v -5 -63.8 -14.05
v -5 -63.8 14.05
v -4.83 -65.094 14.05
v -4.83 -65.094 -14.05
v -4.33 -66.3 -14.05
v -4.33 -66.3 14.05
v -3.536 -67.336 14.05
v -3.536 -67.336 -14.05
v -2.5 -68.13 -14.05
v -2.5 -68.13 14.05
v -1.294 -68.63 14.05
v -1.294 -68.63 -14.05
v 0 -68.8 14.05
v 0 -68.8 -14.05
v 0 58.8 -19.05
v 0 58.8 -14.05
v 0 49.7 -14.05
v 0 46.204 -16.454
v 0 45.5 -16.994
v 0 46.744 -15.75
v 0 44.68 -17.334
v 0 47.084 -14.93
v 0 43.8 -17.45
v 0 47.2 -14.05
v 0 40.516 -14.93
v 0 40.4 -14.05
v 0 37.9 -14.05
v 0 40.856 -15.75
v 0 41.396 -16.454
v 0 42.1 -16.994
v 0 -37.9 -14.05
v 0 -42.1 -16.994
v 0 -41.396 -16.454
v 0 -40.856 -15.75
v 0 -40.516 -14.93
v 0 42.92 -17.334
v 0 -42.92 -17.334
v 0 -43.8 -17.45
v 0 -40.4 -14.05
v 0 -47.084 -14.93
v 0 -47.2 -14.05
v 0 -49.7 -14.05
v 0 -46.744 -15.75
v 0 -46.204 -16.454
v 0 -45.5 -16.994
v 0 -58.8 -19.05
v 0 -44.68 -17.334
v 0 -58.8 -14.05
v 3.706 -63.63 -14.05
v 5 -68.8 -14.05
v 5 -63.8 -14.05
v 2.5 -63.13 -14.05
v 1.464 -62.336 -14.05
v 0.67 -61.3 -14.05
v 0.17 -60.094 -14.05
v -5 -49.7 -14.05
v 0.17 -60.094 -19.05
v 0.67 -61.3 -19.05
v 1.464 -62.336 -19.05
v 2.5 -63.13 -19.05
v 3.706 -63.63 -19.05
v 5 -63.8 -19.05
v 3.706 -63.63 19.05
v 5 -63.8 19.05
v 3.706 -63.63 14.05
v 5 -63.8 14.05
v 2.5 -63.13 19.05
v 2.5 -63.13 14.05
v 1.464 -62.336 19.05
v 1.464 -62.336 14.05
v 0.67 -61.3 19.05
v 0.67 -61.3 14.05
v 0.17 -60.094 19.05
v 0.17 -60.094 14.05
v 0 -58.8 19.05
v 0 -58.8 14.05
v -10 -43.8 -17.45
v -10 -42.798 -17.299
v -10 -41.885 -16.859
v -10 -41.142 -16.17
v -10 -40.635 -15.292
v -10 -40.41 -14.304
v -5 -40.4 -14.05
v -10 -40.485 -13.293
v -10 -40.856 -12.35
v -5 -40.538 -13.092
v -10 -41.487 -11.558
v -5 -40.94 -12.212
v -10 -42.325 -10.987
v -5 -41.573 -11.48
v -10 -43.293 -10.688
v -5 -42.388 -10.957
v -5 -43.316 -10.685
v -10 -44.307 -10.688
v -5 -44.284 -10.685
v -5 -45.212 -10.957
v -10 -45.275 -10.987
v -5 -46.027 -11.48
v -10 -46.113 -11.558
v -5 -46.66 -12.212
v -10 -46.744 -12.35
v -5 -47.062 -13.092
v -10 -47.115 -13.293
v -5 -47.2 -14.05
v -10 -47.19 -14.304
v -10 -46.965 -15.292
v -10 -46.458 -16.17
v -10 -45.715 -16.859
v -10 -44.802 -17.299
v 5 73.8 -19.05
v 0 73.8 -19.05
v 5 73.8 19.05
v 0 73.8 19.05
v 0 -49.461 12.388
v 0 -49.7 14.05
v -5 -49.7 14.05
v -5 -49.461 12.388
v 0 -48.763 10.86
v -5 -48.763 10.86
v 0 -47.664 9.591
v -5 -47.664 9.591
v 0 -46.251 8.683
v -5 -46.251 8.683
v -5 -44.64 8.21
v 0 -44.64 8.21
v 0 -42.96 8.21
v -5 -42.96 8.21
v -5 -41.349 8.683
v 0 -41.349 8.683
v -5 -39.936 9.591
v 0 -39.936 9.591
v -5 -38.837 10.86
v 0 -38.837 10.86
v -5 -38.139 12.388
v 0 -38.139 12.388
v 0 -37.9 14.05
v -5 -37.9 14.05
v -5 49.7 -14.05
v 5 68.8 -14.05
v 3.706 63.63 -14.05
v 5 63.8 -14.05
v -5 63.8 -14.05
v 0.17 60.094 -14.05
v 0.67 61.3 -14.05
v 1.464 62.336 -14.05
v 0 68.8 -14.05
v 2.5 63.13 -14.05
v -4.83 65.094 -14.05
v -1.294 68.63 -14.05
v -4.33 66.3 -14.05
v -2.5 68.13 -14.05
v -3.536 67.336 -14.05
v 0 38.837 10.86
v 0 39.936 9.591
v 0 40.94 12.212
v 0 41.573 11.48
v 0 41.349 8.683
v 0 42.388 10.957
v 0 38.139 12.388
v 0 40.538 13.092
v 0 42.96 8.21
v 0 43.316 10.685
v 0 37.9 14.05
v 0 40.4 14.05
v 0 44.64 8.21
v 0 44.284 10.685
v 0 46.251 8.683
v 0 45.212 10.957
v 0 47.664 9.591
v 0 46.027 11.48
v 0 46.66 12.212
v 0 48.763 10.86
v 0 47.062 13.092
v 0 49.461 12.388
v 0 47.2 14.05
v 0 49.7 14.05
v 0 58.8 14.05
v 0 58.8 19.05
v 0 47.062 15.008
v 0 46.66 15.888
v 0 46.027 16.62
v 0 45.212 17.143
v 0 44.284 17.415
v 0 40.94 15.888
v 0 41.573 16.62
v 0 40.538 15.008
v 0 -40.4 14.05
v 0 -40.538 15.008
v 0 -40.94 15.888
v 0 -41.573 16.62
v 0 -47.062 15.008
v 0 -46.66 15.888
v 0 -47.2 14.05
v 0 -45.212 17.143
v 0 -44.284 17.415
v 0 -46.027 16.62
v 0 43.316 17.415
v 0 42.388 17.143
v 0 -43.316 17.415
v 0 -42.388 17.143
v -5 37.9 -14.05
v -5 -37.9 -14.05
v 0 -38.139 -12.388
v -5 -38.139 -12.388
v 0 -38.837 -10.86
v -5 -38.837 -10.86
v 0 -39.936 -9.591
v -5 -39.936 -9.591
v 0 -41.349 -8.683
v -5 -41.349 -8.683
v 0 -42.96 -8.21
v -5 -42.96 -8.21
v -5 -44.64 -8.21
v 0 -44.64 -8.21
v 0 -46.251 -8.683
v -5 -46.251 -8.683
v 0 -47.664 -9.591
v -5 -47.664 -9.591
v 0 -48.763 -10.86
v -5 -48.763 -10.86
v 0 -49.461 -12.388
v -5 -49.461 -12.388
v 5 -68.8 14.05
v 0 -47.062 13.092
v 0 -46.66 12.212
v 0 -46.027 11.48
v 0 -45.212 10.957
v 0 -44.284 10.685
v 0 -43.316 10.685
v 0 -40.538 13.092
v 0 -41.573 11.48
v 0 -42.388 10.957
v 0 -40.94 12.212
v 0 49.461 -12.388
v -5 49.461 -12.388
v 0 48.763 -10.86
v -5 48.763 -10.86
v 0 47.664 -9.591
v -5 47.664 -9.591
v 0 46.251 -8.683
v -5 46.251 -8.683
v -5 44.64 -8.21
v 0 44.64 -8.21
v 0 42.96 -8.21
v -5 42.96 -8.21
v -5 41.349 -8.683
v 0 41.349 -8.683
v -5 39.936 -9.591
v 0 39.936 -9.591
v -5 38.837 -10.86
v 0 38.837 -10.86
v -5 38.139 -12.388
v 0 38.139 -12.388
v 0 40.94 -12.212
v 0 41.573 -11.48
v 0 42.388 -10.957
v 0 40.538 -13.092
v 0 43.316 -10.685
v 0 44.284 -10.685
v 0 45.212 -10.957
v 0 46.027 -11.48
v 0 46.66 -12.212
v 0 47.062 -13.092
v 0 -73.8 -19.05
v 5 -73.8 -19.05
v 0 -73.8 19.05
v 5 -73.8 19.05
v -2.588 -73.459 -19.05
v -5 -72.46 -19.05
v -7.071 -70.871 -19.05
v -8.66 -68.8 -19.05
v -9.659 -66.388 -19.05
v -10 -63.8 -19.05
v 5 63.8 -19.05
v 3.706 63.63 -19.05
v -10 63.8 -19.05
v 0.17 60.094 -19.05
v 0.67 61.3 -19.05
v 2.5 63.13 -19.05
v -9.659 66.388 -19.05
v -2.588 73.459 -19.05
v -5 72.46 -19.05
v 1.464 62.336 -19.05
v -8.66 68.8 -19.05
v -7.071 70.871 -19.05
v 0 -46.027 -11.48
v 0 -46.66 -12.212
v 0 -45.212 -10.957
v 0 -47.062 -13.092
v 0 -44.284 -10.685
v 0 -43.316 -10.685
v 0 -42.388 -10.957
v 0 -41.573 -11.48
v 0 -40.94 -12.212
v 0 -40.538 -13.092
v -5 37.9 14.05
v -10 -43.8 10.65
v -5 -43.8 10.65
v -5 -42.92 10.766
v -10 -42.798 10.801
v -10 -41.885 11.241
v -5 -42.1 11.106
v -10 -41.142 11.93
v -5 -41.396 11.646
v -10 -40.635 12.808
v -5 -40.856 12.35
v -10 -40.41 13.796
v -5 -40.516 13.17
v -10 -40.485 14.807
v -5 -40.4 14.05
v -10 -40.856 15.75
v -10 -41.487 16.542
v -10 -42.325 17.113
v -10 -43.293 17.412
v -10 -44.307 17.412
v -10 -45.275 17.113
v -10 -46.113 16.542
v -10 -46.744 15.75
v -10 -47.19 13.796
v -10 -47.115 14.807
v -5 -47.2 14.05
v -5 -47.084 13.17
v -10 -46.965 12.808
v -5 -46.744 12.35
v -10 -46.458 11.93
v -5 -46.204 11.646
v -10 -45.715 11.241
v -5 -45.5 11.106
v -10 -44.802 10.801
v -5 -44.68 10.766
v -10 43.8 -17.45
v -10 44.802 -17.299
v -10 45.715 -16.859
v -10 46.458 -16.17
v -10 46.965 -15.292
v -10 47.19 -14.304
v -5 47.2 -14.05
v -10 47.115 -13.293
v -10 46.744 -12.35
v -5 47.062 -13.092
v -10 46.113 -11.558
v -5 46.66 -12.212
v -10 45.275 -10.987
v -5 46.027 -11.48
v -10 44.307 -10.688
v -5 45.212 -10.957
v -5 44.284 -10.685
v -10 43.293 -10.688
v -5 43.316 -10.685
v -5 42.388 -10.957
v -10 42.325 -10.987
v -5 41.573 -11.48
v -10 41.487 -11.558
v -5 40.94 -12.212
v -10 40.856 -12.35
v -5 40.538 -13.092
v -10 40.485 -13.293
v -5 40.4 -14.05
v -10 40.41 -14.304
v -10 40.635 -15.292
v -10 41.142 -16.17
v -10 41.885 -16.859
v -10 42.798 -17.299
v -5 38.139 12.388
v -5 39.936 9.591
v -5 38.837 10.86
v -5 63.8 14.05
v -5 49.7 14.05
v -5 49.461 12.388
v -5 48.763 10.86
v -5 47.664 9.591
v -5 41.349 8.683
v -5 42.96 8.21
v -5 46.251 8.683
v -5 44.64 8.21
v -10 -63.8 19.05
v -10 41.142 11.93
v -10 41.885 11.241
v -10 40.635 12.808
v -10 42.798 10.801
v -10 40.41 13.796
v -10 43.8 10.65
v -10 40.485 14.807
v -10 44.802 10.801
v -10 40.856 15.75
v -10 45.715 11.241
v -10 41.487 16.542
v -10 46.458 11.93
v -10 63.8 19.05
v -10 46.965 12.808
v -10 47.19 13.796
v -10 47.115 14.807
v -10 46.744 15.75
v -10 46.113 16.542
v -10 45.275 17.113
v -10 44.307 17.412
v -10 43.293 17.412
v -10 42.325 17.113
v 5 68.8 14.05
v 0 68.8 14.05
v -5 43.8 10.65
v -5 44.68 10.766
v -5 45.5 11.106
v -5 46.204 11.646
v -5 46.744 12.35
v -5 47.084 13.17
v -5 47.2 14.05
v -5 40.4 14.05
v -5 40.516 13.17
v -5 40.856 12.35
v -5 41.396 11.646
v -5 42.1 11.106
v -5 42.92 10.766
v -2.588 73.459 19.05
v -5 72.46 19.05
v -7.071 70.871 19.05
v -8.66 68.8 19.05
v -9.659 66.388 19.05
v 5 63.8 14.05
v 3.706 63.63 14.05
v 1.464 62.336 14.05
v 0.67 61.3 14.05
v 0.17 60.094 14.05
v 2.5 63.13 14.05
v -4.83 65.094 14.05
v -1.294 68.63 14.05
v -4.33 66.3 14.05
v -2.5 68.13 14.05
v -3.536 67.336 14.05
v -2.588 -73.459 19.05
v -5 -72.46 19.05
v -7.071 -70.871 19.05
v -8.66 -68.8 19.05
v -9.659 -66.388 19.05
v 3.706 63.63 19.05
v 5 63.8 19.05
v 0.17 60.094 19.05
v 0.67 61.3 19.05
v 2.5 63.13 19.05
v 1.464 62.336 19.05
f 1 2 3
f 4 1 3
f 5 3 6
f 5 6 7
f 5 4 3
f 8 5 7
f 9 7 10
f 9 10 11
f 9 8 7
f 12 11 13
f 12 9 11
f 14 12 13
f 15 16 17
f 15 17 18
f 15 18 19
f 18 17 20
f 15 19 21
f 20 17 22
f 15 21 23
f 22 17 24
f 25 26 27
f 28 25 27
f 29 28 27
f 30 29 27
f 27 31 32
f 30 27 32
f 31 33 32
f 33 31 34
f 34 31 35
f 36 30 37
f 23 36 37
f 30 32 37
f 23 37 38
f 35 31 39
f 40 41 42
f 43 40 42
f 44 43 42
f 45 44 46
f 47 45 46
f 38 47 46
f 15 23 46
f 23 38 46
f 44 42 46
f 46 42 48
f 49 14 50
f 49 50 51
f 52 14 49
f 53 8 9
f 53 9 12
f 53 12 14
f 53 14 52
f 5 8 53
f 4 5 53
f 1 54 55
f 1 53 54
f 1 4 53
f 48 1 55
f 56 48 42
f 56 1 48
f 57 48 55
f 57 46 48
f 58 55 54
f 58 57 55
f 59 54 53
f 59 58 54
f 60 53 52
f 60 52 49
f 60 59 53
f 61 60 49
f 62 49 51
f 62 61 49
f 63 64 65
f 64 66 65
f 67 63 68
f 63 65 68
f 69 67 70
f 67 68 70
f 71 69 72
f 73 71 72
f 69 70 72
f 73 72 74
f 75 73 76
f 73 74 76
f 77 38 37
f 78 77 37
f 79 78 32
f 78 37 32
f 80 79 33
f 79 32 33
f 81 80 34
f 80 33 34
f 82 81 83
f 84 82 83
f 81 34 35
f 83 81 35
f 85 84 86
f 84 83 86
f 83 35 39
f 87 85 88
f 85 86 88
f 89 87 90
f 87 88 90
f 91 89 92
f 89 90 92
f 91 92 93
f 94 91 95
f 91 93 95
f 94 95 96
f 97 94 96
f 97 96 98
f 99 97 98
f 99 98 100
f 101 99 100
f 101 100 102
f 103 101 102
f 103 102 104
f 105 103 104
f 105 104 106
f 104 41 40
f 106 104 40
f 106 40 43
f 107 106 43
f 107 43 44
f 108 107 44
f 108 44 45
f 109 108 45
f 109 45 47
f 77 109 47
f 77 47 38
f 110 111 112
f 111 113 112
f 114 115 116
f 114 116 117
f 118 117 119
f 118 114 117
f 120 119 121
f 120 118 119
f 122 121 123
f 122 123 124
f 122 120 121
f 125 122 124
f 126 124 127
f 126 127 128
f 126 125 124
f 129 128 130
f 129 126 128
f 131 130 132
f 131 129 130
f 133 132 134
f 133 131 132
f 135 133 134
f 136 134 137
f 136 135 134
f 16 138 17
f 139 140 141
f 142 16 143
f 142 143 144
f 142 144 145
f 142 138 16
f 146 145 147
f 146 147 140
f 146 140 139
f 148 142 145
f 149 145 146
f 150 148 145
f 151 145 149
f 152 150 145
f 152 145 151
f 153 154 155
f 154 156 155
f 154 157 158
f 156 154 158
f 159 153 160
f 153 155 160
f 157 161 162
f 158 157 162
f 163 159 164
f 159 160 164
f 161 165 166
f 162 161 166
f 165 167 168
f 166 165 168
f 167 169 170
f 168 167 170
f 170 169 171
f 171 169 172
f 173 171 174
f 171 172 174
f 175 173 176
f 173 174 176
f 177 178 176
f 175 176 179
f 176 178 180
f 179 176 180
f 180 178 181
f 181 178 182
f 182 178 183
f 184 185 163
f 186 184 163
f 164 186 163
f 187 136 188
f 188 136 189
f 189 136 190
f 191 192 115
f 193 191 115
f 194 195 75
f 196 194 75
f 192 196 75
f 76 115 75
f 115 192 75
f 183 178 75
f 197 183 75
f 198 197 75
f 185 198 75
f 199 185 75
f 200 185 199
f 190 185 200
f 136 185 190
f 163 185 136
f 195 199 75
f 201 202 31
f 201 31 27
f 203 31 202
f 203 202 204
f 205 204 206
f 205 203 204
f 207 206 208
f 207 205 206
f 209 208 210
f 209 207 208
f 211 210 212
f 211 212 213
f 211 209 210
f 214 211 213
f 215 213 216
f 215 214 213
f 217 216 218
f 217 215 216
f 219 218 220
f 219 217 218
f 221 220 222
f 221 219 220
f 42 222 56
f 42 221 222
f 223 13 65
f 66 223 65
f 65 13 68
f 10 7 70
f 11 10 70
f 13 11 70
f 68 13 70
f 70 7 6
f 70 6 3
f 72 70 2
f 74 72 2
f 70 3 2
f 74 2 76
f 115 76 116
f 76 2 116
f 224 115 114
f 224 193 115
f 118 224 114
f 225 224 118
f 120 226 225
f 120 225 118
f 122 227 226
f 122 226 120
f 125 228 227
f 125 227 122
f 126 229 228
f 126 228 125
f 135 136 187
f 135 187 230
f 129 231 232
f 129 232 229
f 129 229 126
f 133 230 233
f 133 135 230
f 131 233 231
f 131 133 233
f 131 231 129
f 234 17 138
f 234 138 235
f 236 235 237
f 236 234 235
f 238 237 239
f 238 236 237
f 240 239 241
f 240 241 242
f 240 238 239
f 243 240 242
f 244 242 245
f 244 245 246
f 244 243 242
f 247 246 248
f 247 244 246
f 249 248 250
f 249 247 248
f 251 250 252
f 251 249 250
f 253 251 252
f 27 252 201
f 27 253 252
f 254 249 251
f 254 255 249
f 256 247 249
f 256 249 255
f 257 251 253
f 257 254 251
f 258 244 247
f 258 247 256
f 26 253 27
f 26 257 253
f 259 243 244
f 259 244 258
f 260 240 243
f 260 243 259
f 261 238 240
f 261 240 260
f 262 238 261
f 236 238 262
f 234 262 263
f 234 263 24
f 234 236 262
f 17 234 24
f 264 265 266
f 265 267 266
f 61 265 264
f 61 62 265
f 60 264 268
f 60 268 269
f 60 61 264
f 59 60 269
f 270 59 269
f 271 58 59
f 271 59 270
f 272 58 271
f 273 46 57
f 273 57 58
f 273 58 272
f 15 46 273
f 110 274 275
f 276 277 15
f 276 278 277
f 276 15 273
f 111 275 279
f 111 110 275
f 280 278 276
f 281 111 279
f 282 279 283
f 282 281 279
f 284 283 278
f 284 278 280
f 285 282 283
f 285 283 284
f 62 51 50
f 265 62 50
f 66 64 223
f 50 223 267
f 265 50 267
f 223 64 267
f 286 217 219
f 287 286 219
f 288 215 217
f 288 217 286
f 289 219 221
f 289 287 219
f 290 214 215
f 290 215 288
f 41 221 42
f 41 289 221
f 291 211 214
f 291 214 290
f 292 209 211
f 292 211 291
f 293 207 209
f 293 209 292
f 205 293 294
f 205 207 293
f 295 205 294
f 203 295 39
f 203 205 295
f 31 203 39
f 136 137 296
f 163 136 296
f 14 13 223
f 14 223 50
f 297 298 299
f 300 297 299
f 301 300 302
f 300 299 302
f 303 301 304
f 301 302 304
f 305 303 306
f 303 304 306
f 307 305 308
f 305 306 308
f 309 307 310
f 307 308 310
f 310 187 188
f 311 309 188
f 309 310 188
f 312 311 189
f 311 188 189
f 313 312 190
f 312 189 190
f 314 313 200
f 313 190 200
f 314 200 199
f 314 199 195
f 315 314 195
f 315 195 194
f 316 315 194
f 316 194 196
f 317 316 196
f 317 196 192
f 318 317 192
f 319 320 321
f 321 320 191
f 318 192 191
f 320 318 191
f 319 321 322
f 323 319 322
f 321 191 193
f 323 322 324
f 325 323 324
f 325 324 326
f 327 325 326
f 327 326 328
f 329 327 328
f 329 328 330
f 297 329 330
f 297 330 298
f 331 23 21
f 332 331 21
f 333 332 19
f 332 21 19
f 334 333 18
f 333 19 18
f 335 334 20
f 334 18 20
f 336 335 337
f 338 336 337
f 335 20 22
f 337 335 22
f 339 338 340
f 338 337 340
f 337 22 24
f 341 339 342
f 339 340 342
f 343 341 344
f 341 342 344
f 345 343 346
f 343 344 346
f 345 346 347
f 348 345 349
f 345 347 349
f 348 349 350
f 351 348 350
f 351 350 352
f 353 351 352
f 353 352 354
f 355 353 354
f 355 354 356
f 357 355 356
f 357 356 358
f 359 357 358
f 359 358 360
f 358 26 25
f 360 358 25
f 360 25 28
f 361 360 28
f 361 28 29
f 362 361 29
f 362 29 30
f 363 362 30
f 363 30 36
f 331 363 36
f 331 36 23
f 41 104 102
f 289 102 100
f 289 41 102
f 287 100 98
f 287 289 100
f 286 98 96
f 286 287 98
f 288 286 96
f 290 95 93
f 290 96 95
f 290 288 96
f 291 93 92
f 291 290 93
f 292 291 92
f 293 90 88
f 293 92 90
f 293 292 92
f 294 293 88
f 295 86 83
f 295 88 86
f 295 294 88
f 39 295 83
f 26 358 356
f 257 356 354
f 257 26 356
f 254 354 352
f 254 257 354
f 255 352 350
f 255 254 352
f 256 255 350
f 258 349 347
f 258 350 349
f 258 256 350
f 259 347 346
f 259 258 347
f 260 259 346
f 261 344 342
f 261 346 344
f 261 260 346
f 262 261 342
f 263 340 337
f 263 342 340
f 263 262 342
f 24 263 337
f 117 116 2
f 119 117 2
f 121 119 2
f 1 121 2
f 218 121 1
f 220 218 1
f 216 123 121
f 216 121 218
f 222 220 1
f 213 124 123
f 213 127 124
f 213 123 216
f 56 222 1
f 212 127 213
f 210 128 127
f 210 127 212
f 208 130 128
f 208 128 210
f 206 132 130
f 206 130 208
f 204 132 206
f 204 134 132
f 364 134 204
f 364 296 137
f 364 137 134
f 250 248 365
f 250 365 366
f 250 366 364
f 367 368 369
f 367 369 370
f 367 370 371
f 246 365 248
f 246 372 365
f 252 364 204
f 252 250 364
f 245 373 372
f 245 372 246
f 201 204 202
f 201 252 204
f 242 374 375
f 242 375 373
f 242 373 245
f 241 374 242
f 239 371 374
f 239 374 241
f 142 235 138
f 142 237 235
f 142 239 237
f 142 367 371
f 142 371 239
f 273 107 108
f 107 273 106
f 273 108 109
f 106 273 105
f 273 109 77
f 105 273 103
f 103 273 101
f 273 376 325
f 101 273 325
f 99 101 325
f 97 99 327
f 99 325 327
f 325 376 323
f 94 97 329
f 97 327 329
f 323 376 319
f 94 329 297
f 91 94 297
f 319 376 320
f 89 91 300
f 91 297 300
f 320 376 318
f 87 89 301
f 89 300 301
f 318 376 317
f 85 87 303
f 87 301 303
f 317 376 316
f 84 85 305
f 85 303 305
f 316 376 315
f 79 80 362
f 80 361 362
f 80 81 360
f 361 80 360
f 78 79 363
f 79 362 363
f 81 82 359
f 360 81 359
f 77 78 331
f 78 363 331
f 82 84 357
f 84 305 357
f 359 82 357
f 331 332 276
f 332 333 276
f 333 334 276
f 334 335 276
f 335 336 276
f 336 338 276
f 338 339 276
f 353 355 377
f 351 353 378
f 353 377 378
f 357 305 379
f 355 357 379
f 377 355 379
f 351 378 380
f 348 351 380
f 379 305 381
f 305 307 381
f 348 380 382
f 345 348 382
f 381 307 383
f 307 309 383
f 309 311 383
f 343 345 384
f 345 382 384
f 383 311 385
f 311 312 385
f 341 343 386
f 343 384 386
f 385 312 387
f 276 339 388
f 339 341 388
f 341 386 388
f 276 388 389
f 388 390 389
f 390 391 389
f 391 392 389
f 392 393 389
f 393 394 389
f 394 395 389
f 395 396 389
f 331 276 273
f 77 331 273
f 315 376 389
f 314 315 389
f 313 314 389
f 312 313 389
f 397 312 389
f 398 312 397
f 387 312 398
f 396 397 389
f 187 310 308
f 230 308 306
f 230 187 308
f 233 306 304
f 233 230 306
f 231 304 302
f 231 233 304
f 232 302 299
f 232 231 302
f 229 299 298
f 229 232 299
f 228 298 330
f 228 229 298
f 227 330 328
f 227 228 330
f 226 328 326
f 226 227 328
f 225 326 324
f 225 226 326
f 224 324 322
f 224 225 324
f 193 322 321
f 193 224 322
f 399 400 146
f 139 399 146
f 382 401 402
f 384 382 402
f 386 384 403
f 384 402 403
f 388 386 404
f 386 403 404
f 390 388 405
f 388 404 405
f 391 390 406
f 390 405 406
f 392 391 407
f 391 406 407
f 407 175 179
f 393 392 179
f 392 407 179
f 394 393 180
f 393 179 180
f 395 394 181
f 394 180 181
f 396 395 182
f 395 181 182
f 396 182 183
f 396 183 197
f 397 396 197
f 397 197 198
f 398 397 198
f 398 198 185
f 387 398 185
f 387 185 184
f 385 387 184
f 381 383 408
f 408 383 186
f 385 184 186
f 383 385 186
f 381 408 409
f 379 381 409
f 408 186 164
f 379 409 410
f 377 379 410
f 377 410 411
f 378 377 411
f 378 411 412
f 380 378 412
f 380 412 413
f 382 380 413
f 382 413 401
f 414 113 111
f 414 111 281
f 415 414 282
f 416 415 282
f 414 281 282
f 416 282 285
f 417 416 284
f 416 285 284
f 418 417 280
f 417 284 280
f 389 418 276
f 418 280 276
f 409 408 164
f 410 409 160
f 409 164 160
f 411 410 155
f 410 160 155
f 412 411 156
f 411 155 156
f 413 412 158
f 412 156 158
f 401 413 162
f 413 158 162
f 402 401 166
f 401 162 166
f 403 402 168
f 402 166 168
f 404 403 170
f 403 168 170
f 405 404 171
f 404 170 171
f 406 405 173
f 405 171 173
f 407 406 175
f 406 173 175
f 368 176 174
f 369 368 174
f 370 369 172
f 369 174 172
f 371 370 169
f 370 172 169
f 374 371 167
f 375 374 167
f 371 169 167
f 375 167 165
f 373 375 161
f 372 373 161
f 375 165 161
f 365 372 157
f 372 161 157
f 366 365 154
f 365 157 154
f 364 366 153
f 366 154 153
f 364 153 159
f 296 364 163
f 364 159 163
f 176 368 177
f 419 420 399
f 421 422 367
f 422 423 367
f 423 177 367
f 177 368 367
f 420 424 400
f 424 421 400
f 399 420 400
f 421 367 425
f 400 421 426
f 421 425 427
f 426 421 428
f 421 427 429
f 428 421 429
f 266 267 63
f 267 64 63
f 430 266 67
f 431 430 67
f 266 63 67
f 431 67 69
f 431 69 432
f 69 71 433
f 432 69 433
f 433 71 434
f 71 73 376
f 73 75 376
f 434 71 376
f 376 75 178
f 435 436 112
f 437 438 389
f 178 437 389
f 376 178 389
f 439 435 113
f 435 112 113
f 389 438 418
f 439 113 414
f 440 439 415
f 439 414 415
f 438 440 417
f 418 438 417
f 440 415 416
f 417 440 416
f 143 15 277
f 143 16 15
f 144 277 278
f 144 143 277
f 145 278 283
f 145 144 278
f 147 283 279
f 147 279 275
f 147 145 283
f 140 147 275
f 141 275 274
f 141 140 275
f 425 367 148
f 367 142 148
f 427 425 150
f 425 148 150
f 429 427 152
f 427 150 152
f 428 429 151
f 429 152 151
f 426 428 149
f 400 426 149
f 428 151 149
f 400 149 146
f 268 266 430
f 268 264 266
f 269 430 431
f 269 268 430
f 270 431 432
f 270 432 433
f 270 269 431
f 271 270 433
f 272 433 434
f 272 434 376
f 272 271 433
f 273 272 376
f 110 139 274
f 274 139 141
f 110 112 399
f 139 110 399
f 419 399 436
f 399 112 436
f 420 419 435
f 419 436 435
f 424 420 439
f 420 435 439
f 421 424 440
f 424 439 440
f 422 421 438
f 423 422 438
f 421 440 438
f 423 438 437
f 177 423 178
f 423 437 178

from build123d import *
from build123d.topology import SkipClean

# Parameters (mm, degrees)
BOSS_EXTRUDE1_DEPTH              = 19.05
CUT_EXTRUDE1_DEPTH               = 77.872247918
CUT_EXTRUDE1_DEPTH_BACK          = 5
SKETCH3_W                        = 28.1
SKETCH3_H                        = 137.6
FILLET1_R                        = 5
FILLET2_R                        = 10
TAP_DRILL_FOR_M8X1_25_TAP1_D     = 6.8
TAP_DRILL_FOR_M8X1_25_TAP1_DEPTH = 12
TAP_DRILL_FOR_M8X1_25_TAP1_TIP   = 2.042926105
BOSS_EXTRUDE2_START              = 5
BOSS_EXTRUDE2_DEPTH              = 5


with BuildPart() as part:
    # Sketch1 → Boss-Extrude1 (new, symmetric)
    with BuildSketch(Plane.XY):
        Polygon((0, 63.8), (0, -63.8), (5, -63.8), (5, -73.8), (-10, -73.8), (-10, 73.8), (5, 73.8), (5, 63.8), align=None)
    extrude(amount=BOSS_EXTRUDE1_DEPTH, both=True)

    # Sketch3 → Cut-Extrude1 (cut, two sides: drawn at the far end of the back side and taken through both)
    with BuildSketch(Plane(origin=(0, 0, 0), x_dir=(0, 0, -1), z_dir=(1, 0, 0)).offset(-CUT_EXTRUDE1_DEPTH_BACK)):
        Rectangle(SKETCH3_W, SKETCH3_H)
    extrude(amount=CUT_EXTRUDE1_DEPTH + CUT_EXTRUDE1_DEPTH_BACK, mode=Mode.SUBTRACT)

    # Fillet1
    fillet1_edges = [part.edges().sort_by_distance(p)[0] for p in [
        (0, -63.8, 16.55),
        (0, -63.8, -16.55),
        (0, 63.8, 16.55),
        (0, 63.8, -16.55),
        (-5, -68.8, 0),
        (-5, 68.8, 0),
    ]]
    fillet(fillet1_edges, radius=FILLET1_R - 0.0001)  # a hair under: the kernel refuses the full size

    # Fillet2
    fillet2_edges = [part.edges().sort_by_distance(p)[0] for p in [
        (-10, -73.8, 0),
        (-10, 73.8, 0),
    ]]
    fillet(fillet2_edges, radius=FILLET2_R)

    # Tap Drill for M8x1.25 Tap1
    with Locations(Plane.ZY.offset(10)):
        with Locations((-14.05, 43.8), (14.05, 43.8), (-14.05, -43.8), (14.05, -43.8)):
            Hole(TAP_DRILL_FOR_M8X1_25_TAP1_D / 2, depth=TAP_DRILL_FOR_M8X1_25_TAP1_DEPTH)
            with Locations((0, 0, -(TAP_DRILL_FOR_M8X1_25_TAP1_DEPTH + TAP_DRILL_FOR_M8X1_25_TAP1_TIP / 2))):  # 118° drill point
                Cone(0, TAP_DRILL_FOR_M8X1_25_TAP1_D / 2, TAP_DRILL_FOR_M8X1_25_TAP1_TIP, mode=Mode.SUBTRACT)

    # Sketch6 → Boss-Extrude2 (add)
    with SkipClean():  # the faces are left unmerged after this step: merging them gives an invalid solid
        with BuildSketch(Plane(origin=(-5, 0, 0), x_dir=(0, 0, -1), z_dir=(1, 0, 0)).offset(BOSS_EXTRUDE2_START)):
            with BuildLine():
                Line((14.05, -40.4), (14.05, -37.9))
                ThreePointArc((14.05, -37.9), (8.15, -43.8), (14.05, -49.7))
                Line((14.05, -49.7), (14.05, -47.2))
                ThreePointArc((14.05, -47.2), (10.65, -43.8), (14.05, -40.4))
            make_face()
            with BuildLine():
                ThreePointArc((-14.05, -49.7), (-8.15, -43.8), (-14.05, -37.9))
                Line((-14.05, -37.9), (-14.05, -40.4))
                ThreePointArc((-14.05, -40.4), (-10.65, -43.8), (-14.05, -47.2))
                Line((-14.05, -47.2), (-14.05, -49.7))
            make_face()
            with BuildLine():
                Line((14.05, 47.2), (14.05, 49.7))
                ThreePointArc((14.05, 49.7), (8.15, 43.8), (14.05, 37.9))
                Line((14.05, 37.9), (14.05, 40.4))
                ThreePointArc((14.05, 40.4), (10.65, 43.8), (14.05, 47.2))
            make_face()
            with BuildLine():
                ThreePointArc((-14.05, 49.7), (-8.15, 43.8), (-14.05, 37.9))
                Line((-14.05, 37.9), (-14.05, 40.4))
                ThreePointArc((-14.05, 40.4), (-10.65, 43.8), (-14.05, 47.2))
                Line((-14.05, 47.2), (-14.05, 49.7))
            make_face()
        extrude(amount=-BOSS_EXTRUDE2_DEPTH)


solid = part.part
